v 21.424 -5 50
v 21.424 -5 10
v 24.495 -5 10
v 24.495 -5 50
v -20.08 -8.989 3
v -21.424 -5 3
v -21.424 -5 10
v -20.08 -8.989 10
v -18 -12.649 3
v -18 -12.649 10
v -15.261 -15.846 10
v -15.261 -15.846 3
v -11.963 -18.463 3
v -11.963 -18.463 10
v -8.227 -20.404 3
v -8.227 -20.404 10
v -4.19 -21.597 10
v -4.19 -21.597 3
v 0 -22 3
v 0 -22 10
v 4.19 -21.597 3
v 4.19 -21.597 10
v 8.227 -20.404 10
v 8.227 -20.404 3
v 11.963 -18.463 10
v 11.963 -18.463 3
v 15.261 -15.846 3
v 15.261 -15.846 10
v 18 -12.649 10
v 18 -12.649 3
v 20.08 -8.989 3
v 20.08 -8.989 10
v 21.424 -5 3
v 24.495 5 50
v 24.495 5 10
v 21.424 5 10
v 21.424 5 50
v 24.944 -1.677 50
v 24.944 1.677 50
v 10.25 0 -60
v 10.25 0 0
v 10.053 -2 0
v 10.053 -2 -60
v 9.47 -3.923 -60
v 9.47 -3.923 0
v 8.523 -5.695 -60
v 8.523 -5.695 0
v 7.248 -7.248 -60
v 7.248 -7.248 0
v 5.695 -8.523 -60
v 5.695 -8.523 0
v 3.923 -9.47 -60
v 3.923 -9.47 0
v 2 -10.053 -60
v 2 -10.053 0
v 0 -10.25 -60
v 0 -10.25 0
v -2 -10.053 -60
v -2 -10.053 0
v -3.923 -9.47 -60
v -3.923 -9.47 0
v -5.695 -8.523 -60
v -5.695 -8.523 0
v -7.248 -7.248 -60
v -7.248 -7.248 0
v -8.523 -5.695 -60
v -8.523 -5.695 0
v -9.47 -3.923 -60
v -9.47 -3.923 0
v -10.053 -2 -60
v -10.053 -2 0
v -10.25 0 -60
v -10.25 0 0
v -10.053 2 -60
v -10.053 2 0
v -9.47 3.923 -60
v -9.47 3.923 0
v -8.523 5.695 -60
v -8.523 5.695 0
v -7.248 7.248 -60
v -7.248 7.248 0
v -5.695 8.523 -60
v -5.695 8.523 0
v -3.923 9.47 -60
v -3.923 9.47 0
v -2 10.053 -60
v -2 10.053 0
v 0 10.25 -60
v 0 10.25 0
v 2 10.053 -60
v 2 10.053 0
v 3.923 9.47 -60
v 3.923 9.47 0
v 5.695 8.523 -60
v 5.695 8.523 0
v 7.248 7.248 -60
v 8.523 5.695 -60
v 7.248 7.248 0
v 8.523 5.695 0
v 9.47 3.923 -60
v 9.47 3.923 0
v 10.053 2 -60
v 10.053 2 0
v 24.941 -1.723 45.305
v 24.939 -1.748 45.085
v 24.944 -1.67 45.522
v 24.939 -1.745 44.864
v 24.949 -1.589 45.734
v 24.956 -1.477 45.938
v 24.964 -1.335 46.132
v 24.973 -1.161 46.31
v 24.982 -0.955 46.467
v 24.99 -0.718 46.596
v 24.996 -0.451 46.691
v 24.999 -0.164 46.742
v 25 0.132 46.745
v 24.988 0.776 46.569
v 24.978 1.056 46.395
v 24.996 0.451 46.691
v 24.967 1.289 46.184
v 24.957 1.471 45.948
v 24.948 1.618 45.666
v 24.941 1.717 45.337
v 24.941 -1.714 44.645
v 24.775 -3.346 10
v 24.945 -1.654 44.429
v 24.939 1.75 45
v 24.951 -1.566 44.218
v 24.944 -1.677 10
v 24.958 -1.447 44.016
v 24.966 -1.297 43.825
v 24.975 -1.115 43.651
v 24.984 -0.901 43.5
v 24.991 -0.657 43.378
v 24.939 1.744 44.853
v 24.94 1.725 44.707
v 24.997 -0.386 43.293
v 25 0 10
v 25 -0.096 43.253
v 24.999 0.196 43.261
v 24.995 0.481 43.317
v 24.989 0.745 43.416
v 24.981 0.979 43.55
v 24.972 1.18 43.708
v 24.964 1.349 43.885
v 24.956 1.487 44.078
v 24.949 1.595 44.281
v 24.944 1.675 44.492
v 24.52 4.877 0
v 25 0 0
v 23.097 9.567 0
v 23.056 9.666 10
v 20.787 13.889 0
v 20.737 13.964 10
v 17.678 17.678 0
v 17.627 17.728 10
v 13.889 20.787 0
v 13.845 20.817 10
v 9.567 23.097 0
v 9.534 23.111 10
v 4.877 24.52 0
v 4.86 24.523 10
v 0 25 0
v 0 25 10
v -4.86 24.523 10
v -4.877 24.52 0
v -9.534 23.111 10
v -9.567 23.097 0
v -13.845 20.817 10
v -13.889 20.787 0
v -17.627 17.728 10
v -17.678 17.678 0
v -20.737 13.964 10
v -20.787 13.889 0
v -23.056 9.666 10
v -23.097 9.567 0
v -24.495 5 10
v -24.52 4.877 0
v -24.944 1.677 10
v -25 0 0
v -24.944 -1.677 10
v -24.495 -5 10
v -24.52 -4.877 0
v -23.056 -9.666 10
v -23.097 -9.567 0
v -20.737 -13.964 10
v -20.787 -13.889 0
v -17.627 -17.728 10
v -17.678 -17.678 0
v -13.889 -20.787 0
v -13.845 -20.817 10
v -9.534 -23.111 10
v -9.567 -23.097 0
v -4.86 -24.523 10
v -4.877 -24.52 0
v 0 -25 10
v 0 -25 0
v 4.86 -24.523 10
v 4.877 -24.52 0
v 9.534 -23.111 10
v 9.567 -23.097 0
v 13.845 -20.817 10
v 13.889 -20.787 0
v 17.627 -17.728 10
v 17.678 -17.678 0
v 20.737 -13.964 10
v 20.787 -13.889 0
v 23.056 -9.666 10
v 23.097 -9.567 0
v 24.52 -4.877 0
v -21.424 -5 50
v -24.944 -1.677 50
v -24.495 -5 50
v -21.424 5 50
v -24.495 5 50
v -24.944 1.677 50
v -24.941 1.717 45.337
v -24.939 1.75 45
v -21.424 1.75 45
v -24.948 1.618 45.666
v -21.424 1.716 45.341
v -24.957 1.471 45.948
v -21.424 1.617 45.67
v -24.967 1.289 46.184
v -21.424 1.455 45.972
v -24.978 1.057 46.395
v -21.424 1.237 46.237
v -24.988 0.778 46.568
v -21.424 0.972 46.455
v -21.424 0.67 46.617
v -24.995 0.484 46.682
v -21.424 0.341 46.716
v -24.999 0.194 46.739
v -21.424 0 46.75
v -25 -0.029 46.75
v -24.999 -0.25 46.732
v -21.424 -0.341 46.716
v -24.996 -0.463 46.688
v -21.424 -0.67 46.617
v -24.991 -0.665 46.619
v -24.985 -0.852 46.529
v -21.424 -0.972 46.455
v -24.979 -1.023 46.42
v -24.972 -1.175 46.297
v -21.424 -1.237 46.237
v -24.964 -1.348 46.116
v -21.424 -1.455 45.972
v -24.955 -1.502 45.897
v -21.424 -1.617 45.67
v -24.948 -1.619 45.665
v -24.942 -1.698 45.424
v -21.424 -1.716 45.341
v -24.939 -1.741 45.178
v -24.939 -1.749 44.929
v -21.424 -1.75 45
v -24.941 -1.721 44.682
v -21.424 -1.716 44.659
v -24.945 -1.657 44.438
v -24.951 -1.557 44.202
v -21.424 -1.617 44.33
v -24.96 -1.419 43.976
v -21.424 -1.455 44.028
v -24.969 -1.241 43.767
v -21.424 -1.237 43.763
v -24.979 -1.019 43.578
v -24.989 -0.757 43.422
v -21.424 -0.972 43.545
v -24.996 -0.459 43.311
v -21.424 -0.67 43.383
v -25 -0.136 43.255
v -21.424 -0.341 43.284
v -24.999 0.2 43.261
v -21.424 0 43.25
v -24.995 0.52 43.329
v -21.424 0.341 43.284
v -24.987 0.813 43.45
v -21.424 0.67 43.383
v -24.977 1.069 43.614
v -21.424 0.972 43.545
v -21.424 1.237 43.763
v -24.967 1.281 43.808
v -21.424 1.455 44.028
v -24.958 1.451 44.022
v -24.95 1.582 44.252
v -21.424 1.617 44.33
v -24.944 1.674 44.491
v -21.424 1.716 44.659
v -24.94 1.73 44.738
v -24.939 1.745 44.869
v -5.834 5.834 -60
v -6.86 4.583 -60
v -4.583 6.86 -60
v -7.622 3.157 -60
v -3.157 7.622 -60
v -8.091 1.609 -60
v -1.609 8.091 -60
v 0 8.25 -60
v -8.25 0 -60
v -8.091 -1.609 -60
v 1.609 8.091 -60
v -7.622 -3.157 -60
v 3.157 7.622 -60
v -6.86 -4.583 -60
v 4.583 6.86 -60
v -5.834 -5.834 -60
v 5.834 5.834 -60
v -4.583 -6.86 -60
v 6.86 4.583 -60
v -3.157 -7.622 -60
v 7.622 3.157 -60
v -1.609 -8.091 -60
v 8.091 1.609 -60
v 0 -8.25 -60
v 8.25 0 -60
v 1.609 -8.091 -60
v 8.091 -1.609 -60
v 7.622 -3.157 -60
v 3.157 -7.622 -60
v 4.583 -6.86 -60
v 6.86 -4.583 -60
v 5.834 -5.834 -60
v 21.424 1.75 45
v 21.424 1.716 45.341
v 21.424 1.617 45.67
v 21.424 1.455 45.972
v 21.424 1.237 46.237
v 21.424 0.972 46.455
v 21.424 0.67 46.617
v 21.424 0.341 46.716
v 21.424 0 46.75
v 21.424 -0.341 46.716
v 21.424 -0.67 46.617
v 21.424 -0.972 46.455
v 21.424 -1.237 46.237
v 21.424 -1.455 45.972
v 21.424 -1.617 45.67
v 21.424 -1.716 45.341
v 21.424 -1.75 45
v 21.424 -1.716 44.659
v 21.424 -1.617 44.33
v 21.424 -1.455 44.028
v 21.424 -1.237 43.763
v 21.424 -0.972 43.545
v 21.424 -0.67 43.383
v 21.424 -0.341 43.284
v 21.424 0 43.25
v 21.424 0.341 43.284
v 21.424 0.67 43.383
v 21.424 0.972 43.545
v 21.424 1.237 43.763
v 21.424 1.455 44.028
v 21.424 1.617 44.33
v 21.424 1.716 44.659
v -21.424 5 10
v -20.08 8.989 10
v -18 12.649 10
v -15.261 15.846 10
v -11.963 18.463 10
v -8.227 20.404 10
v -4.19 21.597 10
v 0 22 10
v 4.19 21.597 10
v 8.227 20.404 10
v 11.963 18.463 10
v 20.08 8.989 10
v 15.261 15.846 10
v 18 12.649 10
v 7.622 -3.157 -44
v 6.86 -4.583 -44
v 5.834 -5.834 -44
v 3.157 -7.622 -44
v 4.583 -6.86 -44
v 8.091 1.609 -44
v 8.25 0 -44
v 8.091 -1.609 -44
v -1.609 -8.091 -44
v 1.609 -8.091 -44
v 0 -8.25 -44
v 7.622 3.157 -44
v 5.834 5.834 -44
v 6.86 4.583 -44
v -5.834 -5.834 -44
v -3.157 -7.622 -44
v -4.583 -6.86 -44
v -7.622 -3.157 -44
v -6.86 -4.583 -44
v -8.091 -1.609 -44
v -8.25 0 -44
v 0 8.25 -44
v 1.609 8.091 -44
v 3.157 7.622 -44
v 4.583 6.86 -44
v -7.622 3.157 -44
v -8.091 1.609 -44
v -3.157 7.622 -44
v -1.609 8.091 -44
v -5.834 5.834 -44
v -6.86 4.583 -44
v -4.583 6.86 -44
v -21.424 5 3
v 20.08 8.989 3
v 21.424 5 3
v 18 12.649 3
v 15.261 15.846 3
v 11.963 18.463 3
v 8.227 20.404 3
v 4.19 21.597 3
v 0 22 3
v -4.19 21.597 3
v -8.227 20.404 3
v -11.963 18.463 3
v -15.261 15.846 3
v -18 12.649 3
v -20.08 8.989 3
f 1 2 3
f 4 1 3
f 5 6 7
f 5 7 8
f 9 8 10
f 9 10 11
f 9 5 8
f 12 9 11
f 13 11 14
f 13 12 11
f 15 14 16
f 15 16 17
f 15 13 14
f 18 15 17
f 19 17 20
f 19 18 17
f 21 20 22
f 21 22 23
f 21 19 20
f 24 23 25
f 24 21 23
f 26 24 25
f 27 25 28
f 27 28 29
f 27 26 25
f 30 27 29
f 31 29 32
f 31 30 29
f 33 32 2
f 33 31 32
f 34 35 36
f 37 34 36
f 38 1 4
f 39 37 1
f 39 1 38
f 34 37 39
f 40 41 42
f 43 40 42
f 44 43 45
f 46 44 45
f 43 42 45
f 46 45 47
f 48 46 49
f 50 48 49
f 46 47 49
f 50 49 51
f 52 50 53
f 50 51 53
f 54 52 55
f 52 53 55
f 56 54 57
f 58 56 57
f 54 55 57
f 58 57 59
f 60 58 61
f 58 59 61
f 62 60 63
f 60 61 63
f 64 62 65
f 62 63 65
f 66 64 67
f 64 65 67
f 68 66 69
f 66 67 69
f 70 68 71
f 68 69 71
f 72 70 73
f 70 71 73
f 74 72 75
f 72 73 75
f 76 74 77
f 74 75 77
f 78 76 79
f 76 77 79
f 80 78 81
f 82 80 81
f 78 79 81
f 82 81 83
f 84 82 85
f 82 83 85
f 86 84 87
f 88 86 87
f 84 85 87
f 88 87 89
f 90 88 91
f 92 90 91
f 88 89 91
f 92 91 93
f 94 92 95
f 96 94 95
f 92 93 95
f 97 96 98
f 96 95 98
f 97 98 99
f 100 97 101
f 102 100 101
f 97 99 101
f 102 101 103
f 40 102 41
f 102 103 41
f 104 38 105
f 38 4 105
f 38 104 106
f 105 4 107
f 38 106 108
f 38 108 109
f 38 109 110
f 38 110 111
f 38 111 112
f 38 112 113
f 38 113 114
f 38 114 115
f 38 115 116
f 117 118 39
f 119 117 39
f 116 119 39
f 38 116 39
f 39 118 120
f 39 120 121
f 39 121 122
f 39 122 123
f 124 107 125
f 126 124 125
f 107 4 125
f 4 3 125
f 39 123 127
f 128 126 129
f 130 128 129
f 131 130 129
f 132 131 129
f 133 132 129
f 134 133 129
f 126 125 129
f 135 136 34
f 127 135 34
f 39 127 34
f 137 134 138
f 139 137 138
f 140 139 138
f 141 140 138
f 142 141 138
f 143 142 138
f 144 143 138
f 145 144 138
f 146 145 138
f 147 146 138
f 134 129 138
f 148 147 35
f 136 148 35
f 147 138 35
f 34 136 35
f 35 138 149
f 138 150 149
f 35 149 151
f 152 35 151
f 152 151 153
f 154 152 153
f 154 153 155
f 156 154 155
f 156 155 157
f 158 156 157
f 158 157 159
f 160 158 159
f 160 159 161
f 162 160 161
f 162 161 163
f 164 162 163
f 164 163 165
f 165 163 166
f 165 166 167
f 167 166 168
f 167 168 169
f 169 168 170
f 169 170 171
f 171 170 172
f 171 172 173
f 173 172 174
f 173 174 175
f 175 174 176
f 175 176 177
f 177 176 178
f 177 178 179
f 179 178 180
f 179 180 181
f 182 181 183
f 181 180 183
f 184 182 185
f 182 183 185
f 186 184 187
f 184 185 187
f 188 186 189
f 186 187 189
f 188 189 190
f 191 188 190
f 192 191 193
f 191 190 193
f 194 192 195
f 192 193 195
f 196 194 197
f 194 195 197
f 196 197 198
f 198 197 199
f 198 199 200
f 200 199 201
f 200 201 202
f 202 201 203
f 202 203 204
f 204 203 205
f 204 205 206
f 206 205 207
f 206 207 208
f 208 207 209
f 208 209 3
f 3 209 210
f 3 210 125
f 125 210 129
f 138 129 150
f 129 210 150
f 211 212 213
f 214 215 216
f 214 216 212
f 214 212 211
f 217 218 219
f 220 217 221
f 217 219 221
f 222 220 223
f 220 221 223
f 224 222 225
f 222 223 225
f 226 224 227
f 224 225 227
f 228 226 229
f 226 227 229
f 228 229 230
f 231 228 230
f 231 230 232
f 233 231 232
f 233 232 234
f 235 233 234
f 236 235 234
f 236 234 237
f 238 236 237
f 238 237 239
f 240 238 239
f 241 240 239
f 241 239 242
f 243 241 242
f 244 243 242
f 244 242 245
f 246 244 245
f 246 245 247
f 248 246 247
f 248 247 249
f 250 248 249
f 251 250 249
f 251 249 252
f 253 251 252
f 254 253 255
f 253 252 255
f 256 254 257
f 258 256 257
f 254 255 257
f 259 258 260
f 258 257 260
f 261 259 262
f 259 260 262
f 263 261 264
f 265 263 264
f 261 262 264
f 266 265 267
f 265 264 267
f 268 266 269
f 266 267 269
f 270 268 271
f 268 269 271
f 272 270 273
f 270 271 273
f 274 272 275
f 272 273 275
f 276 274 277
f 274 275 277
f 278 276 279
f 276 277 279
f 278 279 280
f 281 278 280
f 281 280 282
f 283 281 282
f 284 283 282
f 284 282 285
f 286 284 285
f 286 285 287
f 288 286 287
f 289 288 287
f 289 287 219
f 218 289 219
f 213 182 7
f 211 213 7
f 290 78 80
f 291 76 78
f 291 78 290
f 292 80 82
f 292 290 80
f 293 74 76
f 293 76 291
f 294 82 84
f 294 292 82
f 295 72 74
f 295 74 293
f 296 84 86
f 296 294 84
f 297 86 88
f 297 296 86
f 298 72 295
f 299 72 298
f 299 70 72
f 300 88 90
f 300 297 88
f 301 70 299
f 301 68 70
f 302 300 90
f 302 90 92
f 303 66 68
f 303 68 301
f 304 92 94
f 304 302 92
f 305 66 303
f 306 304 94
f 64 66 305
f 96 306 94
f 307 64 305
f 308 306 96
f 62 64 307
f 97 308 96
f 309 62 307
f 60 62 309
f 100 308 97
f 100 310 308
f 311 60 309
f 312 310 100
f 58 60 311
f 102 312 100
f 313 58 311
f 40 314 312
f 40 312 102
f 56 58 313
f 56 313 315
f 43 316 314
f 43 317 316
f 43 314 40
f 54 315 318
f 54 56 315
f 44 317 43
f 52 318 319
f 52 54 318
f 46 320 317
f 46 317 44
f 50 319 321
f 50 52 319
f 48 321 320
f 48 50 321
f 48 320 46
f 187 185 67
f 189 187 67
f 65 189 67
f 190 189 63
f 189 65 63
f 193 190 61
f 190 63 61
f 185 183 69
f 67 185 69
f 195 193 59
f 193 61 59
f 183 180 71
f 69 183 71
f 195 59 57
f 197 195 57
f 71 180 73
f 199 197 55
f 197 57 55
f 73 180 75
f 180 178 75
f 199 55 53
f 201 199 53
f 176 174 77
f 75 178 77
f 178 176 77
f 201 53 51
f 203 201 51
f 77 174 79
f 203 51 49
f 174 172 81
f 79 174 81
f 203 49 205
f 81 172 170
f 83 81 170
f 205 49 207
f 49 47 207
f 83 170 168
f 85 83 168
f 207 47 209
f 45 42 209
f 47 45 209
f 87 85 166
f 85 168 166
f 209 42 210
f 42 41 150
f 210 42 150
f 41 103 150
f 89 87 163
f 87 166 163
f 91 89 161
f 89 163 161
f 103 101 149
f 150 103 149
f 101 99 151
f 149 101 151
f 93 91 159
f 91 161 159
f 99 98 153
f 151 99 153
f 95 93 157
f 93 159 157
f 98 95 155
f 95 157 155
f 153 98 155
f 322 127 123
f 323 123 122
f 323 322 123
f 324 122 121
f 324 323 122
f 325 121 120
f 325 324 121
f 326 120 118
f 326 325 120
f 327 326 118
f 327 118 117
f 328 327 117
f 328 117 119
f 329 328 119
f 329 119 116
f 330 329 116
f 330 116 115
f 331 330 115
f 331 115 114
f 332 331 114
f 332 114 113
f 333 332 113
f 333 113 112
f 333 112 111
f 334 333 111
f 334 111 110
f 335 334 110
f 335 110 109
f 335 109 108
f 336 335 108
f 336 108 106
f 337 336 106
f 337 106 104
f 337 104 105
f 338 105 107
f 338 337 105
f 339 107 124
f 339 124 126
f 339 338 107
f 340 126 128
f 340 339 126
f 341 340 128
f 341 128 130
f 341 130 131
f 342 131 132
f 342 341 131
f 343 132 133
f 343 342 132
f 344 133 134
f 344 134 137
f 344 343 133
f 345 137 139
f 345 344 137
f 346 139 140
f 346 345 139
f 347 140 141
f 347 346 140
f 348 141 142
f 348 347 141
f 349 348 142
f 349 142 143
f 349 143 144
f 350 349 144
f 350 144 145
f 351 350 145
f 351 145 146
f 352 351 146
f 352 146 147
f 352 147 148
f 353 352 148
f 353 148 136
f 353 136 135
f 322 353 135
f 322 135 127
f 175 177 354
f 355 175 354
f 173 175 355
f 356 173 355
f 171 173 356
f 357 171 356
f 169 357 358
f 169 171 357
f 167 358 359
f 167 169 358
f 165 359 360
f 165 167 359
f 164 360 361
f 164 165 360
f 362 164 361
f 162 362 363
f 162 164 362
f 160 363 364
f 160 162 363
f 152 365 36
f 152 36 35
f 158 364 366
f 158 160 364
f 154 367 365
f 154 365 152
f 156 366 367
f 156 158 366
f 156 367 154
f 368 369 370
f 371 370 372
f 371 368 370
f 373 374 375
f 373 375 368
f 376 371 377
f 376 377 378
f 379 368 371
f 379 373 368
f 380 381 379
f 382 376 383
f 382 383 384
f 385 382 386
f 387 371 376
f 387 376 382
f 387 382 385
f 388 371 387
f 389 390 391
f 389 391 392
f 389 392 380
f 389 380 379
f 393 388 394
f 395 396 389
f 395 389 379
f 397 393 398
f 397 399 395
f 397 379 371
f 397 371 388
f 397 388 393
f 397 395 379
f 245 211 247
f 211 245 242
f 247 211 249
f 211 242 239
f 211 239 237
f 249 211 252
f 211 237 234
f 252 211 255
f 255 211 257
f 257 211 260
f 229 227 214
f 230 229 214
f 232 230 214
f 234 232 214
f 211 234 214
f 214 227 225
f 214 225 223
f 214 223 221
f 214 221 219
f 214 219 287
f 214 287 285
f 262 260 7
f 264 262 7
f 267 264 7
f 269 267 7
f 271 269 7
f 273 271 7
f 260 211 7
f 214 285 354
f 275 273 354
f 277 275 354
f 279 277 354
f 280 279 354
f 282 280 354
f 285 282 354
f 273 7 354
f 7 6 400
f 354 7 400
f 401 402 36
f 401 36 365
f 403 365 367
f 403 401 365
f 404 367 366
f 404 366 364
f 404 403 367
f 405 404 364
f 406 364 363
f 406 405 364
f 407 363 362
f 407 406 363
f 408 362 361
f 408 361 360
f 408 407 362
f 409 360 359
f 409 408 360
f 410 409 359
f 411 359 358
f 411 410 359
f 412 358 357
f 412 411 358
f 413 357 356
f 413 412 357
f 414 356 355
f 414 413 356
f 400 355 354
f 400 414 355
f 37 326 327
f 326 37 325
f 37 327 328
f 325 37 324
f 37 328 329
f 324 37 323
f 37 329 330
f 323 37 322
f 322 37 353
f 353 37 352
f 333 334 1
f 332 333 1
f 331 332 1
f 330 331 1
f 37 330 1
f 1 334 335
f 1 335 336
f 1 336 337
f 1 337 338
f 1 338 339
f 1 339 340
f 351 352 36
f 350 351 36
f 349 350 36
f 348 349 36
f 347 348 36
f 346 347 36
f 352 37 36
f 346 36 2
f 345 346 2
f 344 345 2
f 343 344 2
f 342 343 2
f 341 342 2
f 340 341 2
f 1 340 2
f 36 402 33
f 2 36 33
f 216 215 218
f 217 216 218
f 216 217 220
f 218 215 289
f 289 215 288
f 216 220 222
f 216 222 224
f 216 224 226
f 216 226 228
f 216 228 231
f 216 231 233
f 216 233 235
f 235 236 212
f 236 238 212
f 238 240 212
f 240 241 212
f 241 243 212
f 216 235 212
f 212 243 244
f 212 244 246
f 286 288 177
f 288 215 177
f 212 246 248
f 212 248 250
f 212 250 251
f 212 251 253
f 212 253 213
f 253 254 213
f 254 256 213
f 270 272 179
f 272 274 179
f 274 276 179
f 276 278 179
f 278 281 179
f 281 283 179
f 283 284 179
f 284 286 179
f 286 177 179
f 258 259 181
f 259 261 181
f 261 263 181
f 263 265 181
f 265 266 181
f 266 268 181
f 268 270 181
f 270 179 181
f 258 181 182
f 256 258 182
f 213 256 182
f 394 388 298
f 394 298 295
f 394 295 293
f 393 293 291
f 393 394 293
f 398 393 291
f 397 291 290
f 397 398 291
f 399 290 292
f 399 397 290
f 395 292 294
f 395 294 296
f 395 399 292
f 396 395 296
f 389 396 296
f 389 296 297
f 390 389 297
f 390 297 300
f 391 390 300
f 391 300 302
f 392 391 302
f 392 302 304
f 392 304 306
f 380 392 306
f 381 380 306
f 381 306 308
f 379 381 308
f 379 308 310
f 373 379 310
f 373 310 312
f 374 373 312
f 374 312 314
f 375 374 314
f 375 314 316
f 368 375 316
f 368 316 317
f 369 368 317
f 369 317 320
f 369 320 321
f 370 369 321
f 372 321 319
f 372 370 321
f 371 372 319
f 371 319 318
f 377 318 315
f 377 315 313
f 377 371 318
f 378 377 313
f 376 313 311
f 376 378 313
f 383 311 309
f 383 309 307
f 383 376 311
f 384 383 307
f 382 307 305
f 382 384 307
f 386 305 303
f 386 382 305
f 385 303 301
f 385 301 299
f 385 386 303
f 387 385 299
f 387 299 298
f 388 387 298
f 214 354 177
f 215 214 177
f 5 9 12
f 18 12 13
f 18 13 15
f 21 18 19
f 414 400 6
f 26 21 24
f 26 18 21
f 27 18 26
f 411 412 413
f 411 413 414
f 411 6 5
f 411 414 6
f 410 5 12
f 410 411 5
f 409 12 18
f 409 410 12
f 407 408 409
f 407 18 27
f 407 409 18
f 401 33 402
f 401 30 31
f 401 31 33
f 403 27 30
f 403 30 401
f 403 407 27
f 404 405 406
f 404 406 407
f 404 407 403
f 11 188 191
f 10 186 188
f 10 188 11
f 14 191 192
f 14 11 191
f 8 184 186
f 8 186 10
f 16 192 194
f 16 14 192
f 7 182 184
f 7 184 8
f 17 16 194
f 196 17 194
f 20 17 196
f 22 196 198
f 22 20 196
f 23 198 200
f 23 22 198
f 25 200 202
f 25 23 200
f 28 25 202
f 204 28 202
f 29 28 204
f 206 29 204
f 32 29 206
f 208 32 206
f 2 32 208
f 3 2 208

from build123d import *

# Parameters (mm, degrees)
SKETCH1_R                           = 25
SKETCH1_R_2                         = 22
BOSS_EXTRUDE1_DEPTH                 = 10
SKETCH1_2_R                         = 22
BOSS_EXTRUDE2_DEPTH                 = 3
BOSS_EXTRUDE3_START                 = -7
BOSS_EXTRUDE3_DEPTH                 = 7
BOSS_EXTRUDE4_DEPTH                 = 40
CUT_EXTRUDE1_REACH                  = 74.665
CUT_EXTRUDE1_END_RADIUS             = 25
SKETCH3_R                           = 1.75
CUT_EXTRUDE1_DIRECTION_2_REACH      = 74.665
CUT_EXTRUDE1_DIRECTION_2_END_RADIUS = 25
SKETCH4_R                           = 10.25
SKETCH4_R_2                         = 8.25
BOSS_EXTRUDE5_DEPTH                 = 60
SKETCH4_2_R                         = 8.25
BOSS_EXTRUDE6_DEPTH                 = 44


with BuildPart() as part:
    # Sketch1 → Boss-Extrude1 (new body)
    with BuildSketch(Plane.XY):
        Circle(SKETCH1_R)
        Circle(SKETCH1_R_2, mode=Mode.SUBTRACT)
    extrude(amount=BOSS_EXTRUDE1_DEPTH)

    # Sketch1<2> → Boss-Extrude2 (add)
    with BuildSketch(Plane.XY):
        Circle(SKETCH1_2_R)
    extrude(amount=BOSS_EXTRUDE2_DEPTH)

    # Sketch2 → Boss-Extrude3 (add)
    with BuildSketch(Plane.XY.offset(10).offset(BOSS_EXTRUDE3_START)):
        with BuildLine():
            Line((-21.424285286, -5), (-21.424285286, 5))
            ThreePointArc((-21.424285286, 5), (-22, 0), (-21.424285286, -5))
        make_face()
        with BuildLine():
            ThreePointArc((22, 0), (21.85559741, 2.516517804), (21.424285286, 5))
            Line((21.424285286, 5), (21.424285286, -5))
            ThreePointArc((21.424285286, -5), (21.85559741, -2.516517804), (22, 0))
        make_face()
    extrude(amount=BOSS_EXTRUDE3_DEPTH)

    # Sketch2<4> → Boss-Extrude4 (add)
    with BuildSketch(Plane.XY.offset(10)):
        with BuildLine():
            Line((-21.424285286, 5), (-24.494897428, 5))
            ThreePointArc((-24.494897428, 5), (-25, 0), (-24.494897428, -5))
            Line((-24.494897428, -5), (-21.424285286, -5))
            Line((-21.424285286, -5), (-21.424285286, 5))
        make_face()
        with BuildLine():
            Line((24.494897428, 5), (21.424285286, 5))
            Line((21.424285286, 5), (21.424285286, -5))
            Line((21.424285286, -5), (24.494897428, -5))
            ThreePointArc((24.494897428, -5), (25, 0), (24.494897428, 5))
        make_face()
    extrude(amount=BOSS_EXTRUDE4_DEPTH)

    # Cut-Extrude1: up to this cylinder (the profile starts inside it)
    cut_extrude1_end = Plane(origin=(0, 0, 45), z_dir=(0, 0, -1)) * Cylinder(CUT_EXTRUDE1_END_RADIUS, 200.33, mode=Mode.PRIVATE)
    # Sketch3 → Cut-Extrude1 (cut, up to the surface)
    with BuildSketch(Plane(origin=(-21.424285286, 0, 0), x_dir=(0, 0, -1), z_dir=(1, 0, 0)), mode=Mode.PRIVATE) as cut_extrude1_sk1:
        with Locations(Location((-45, 0, 0), (0, 0, 90))):
            Circle(SKETCH3_R)
    cut_extrude1_tool1 = extrude(cut_extrude1_sk1.sketch, amount=-CUT_EXTRUDE1_REACH, mode=Mode.PRIVATE) & cut_extrude1_end
    add(cut_extrude1_tool1.solids().sort_by_distance((-21.424285, 0, 45))[0], mode=Mode.SUBTRACT)

    # Cut-Extrude1 direction 2: up to this cylinder (the profile starts inside it)
    cut_extrude1_direction_2_end = Plane(origin=(0, 0, 45), z_dir=(0, 0, -1)) * Cylinder(CUT_EXTRUDE1_DIRECTION_2_END_RADIUS, 200.33, mode=Mode.PRIVATE)
    # Sketch3 → Cut-Extrude1 direction 2 (cut, up to the surface)
    with BuildSketch(Plane(origin=(-21.424285286, 0, 0), x_dir=(0, 0, -1), z_dir=(1, 0, 0)), mode=Mode.PRIVATE) as cut_extrude1_direction_2_sk1:
        with Locations(Location((-45, 0, 0), (0, 0, 90))):
            Circle(SKETCH3_R)
    cut_extrude1_direction_2_tool1 = extrude(cut_extrude1_direction_2_sk1.sketch, amount=CUT_EXTRUDE1_DIRECTION_2_REACH, mode=Mode.PRIVATE) & cut_extrude1_direction_2_end
    add(cut_extrude1_direction_2_tool1.solids().sort_by_distance((-21.424285, 0, 45))[0], mode=Mode.SUBTRACT)

    # Sketch4 → Boss-Extrude5 (add)
    with BuildSketch(Plane(origin=(0, 0, 0), x_dir=(-1, 0, 0), z_dir=(0, 0, -1))):
        with Locations(Location((0, 0, 0), (0, 0, 180))):
            Circle(SKETCH4_R)
        Circle(SKETCH4_R_2, mode=Mode.SUBTRACT)
    extrude(amount=BOSS_EXTRUDE5_DEPTH)

    # Sketch4<2> → Boss-Extrude6 (add)
    with BuildSketch(Plane(origin=(0, 0, 0), x_dir=(-1, 0, 0), z_dir=(0, 0, -1))):
        Circle(SKETCH4_2_R)
    extrude(amount=BOSS_EXTRUDE6_DEPTH)


solid = part.part
